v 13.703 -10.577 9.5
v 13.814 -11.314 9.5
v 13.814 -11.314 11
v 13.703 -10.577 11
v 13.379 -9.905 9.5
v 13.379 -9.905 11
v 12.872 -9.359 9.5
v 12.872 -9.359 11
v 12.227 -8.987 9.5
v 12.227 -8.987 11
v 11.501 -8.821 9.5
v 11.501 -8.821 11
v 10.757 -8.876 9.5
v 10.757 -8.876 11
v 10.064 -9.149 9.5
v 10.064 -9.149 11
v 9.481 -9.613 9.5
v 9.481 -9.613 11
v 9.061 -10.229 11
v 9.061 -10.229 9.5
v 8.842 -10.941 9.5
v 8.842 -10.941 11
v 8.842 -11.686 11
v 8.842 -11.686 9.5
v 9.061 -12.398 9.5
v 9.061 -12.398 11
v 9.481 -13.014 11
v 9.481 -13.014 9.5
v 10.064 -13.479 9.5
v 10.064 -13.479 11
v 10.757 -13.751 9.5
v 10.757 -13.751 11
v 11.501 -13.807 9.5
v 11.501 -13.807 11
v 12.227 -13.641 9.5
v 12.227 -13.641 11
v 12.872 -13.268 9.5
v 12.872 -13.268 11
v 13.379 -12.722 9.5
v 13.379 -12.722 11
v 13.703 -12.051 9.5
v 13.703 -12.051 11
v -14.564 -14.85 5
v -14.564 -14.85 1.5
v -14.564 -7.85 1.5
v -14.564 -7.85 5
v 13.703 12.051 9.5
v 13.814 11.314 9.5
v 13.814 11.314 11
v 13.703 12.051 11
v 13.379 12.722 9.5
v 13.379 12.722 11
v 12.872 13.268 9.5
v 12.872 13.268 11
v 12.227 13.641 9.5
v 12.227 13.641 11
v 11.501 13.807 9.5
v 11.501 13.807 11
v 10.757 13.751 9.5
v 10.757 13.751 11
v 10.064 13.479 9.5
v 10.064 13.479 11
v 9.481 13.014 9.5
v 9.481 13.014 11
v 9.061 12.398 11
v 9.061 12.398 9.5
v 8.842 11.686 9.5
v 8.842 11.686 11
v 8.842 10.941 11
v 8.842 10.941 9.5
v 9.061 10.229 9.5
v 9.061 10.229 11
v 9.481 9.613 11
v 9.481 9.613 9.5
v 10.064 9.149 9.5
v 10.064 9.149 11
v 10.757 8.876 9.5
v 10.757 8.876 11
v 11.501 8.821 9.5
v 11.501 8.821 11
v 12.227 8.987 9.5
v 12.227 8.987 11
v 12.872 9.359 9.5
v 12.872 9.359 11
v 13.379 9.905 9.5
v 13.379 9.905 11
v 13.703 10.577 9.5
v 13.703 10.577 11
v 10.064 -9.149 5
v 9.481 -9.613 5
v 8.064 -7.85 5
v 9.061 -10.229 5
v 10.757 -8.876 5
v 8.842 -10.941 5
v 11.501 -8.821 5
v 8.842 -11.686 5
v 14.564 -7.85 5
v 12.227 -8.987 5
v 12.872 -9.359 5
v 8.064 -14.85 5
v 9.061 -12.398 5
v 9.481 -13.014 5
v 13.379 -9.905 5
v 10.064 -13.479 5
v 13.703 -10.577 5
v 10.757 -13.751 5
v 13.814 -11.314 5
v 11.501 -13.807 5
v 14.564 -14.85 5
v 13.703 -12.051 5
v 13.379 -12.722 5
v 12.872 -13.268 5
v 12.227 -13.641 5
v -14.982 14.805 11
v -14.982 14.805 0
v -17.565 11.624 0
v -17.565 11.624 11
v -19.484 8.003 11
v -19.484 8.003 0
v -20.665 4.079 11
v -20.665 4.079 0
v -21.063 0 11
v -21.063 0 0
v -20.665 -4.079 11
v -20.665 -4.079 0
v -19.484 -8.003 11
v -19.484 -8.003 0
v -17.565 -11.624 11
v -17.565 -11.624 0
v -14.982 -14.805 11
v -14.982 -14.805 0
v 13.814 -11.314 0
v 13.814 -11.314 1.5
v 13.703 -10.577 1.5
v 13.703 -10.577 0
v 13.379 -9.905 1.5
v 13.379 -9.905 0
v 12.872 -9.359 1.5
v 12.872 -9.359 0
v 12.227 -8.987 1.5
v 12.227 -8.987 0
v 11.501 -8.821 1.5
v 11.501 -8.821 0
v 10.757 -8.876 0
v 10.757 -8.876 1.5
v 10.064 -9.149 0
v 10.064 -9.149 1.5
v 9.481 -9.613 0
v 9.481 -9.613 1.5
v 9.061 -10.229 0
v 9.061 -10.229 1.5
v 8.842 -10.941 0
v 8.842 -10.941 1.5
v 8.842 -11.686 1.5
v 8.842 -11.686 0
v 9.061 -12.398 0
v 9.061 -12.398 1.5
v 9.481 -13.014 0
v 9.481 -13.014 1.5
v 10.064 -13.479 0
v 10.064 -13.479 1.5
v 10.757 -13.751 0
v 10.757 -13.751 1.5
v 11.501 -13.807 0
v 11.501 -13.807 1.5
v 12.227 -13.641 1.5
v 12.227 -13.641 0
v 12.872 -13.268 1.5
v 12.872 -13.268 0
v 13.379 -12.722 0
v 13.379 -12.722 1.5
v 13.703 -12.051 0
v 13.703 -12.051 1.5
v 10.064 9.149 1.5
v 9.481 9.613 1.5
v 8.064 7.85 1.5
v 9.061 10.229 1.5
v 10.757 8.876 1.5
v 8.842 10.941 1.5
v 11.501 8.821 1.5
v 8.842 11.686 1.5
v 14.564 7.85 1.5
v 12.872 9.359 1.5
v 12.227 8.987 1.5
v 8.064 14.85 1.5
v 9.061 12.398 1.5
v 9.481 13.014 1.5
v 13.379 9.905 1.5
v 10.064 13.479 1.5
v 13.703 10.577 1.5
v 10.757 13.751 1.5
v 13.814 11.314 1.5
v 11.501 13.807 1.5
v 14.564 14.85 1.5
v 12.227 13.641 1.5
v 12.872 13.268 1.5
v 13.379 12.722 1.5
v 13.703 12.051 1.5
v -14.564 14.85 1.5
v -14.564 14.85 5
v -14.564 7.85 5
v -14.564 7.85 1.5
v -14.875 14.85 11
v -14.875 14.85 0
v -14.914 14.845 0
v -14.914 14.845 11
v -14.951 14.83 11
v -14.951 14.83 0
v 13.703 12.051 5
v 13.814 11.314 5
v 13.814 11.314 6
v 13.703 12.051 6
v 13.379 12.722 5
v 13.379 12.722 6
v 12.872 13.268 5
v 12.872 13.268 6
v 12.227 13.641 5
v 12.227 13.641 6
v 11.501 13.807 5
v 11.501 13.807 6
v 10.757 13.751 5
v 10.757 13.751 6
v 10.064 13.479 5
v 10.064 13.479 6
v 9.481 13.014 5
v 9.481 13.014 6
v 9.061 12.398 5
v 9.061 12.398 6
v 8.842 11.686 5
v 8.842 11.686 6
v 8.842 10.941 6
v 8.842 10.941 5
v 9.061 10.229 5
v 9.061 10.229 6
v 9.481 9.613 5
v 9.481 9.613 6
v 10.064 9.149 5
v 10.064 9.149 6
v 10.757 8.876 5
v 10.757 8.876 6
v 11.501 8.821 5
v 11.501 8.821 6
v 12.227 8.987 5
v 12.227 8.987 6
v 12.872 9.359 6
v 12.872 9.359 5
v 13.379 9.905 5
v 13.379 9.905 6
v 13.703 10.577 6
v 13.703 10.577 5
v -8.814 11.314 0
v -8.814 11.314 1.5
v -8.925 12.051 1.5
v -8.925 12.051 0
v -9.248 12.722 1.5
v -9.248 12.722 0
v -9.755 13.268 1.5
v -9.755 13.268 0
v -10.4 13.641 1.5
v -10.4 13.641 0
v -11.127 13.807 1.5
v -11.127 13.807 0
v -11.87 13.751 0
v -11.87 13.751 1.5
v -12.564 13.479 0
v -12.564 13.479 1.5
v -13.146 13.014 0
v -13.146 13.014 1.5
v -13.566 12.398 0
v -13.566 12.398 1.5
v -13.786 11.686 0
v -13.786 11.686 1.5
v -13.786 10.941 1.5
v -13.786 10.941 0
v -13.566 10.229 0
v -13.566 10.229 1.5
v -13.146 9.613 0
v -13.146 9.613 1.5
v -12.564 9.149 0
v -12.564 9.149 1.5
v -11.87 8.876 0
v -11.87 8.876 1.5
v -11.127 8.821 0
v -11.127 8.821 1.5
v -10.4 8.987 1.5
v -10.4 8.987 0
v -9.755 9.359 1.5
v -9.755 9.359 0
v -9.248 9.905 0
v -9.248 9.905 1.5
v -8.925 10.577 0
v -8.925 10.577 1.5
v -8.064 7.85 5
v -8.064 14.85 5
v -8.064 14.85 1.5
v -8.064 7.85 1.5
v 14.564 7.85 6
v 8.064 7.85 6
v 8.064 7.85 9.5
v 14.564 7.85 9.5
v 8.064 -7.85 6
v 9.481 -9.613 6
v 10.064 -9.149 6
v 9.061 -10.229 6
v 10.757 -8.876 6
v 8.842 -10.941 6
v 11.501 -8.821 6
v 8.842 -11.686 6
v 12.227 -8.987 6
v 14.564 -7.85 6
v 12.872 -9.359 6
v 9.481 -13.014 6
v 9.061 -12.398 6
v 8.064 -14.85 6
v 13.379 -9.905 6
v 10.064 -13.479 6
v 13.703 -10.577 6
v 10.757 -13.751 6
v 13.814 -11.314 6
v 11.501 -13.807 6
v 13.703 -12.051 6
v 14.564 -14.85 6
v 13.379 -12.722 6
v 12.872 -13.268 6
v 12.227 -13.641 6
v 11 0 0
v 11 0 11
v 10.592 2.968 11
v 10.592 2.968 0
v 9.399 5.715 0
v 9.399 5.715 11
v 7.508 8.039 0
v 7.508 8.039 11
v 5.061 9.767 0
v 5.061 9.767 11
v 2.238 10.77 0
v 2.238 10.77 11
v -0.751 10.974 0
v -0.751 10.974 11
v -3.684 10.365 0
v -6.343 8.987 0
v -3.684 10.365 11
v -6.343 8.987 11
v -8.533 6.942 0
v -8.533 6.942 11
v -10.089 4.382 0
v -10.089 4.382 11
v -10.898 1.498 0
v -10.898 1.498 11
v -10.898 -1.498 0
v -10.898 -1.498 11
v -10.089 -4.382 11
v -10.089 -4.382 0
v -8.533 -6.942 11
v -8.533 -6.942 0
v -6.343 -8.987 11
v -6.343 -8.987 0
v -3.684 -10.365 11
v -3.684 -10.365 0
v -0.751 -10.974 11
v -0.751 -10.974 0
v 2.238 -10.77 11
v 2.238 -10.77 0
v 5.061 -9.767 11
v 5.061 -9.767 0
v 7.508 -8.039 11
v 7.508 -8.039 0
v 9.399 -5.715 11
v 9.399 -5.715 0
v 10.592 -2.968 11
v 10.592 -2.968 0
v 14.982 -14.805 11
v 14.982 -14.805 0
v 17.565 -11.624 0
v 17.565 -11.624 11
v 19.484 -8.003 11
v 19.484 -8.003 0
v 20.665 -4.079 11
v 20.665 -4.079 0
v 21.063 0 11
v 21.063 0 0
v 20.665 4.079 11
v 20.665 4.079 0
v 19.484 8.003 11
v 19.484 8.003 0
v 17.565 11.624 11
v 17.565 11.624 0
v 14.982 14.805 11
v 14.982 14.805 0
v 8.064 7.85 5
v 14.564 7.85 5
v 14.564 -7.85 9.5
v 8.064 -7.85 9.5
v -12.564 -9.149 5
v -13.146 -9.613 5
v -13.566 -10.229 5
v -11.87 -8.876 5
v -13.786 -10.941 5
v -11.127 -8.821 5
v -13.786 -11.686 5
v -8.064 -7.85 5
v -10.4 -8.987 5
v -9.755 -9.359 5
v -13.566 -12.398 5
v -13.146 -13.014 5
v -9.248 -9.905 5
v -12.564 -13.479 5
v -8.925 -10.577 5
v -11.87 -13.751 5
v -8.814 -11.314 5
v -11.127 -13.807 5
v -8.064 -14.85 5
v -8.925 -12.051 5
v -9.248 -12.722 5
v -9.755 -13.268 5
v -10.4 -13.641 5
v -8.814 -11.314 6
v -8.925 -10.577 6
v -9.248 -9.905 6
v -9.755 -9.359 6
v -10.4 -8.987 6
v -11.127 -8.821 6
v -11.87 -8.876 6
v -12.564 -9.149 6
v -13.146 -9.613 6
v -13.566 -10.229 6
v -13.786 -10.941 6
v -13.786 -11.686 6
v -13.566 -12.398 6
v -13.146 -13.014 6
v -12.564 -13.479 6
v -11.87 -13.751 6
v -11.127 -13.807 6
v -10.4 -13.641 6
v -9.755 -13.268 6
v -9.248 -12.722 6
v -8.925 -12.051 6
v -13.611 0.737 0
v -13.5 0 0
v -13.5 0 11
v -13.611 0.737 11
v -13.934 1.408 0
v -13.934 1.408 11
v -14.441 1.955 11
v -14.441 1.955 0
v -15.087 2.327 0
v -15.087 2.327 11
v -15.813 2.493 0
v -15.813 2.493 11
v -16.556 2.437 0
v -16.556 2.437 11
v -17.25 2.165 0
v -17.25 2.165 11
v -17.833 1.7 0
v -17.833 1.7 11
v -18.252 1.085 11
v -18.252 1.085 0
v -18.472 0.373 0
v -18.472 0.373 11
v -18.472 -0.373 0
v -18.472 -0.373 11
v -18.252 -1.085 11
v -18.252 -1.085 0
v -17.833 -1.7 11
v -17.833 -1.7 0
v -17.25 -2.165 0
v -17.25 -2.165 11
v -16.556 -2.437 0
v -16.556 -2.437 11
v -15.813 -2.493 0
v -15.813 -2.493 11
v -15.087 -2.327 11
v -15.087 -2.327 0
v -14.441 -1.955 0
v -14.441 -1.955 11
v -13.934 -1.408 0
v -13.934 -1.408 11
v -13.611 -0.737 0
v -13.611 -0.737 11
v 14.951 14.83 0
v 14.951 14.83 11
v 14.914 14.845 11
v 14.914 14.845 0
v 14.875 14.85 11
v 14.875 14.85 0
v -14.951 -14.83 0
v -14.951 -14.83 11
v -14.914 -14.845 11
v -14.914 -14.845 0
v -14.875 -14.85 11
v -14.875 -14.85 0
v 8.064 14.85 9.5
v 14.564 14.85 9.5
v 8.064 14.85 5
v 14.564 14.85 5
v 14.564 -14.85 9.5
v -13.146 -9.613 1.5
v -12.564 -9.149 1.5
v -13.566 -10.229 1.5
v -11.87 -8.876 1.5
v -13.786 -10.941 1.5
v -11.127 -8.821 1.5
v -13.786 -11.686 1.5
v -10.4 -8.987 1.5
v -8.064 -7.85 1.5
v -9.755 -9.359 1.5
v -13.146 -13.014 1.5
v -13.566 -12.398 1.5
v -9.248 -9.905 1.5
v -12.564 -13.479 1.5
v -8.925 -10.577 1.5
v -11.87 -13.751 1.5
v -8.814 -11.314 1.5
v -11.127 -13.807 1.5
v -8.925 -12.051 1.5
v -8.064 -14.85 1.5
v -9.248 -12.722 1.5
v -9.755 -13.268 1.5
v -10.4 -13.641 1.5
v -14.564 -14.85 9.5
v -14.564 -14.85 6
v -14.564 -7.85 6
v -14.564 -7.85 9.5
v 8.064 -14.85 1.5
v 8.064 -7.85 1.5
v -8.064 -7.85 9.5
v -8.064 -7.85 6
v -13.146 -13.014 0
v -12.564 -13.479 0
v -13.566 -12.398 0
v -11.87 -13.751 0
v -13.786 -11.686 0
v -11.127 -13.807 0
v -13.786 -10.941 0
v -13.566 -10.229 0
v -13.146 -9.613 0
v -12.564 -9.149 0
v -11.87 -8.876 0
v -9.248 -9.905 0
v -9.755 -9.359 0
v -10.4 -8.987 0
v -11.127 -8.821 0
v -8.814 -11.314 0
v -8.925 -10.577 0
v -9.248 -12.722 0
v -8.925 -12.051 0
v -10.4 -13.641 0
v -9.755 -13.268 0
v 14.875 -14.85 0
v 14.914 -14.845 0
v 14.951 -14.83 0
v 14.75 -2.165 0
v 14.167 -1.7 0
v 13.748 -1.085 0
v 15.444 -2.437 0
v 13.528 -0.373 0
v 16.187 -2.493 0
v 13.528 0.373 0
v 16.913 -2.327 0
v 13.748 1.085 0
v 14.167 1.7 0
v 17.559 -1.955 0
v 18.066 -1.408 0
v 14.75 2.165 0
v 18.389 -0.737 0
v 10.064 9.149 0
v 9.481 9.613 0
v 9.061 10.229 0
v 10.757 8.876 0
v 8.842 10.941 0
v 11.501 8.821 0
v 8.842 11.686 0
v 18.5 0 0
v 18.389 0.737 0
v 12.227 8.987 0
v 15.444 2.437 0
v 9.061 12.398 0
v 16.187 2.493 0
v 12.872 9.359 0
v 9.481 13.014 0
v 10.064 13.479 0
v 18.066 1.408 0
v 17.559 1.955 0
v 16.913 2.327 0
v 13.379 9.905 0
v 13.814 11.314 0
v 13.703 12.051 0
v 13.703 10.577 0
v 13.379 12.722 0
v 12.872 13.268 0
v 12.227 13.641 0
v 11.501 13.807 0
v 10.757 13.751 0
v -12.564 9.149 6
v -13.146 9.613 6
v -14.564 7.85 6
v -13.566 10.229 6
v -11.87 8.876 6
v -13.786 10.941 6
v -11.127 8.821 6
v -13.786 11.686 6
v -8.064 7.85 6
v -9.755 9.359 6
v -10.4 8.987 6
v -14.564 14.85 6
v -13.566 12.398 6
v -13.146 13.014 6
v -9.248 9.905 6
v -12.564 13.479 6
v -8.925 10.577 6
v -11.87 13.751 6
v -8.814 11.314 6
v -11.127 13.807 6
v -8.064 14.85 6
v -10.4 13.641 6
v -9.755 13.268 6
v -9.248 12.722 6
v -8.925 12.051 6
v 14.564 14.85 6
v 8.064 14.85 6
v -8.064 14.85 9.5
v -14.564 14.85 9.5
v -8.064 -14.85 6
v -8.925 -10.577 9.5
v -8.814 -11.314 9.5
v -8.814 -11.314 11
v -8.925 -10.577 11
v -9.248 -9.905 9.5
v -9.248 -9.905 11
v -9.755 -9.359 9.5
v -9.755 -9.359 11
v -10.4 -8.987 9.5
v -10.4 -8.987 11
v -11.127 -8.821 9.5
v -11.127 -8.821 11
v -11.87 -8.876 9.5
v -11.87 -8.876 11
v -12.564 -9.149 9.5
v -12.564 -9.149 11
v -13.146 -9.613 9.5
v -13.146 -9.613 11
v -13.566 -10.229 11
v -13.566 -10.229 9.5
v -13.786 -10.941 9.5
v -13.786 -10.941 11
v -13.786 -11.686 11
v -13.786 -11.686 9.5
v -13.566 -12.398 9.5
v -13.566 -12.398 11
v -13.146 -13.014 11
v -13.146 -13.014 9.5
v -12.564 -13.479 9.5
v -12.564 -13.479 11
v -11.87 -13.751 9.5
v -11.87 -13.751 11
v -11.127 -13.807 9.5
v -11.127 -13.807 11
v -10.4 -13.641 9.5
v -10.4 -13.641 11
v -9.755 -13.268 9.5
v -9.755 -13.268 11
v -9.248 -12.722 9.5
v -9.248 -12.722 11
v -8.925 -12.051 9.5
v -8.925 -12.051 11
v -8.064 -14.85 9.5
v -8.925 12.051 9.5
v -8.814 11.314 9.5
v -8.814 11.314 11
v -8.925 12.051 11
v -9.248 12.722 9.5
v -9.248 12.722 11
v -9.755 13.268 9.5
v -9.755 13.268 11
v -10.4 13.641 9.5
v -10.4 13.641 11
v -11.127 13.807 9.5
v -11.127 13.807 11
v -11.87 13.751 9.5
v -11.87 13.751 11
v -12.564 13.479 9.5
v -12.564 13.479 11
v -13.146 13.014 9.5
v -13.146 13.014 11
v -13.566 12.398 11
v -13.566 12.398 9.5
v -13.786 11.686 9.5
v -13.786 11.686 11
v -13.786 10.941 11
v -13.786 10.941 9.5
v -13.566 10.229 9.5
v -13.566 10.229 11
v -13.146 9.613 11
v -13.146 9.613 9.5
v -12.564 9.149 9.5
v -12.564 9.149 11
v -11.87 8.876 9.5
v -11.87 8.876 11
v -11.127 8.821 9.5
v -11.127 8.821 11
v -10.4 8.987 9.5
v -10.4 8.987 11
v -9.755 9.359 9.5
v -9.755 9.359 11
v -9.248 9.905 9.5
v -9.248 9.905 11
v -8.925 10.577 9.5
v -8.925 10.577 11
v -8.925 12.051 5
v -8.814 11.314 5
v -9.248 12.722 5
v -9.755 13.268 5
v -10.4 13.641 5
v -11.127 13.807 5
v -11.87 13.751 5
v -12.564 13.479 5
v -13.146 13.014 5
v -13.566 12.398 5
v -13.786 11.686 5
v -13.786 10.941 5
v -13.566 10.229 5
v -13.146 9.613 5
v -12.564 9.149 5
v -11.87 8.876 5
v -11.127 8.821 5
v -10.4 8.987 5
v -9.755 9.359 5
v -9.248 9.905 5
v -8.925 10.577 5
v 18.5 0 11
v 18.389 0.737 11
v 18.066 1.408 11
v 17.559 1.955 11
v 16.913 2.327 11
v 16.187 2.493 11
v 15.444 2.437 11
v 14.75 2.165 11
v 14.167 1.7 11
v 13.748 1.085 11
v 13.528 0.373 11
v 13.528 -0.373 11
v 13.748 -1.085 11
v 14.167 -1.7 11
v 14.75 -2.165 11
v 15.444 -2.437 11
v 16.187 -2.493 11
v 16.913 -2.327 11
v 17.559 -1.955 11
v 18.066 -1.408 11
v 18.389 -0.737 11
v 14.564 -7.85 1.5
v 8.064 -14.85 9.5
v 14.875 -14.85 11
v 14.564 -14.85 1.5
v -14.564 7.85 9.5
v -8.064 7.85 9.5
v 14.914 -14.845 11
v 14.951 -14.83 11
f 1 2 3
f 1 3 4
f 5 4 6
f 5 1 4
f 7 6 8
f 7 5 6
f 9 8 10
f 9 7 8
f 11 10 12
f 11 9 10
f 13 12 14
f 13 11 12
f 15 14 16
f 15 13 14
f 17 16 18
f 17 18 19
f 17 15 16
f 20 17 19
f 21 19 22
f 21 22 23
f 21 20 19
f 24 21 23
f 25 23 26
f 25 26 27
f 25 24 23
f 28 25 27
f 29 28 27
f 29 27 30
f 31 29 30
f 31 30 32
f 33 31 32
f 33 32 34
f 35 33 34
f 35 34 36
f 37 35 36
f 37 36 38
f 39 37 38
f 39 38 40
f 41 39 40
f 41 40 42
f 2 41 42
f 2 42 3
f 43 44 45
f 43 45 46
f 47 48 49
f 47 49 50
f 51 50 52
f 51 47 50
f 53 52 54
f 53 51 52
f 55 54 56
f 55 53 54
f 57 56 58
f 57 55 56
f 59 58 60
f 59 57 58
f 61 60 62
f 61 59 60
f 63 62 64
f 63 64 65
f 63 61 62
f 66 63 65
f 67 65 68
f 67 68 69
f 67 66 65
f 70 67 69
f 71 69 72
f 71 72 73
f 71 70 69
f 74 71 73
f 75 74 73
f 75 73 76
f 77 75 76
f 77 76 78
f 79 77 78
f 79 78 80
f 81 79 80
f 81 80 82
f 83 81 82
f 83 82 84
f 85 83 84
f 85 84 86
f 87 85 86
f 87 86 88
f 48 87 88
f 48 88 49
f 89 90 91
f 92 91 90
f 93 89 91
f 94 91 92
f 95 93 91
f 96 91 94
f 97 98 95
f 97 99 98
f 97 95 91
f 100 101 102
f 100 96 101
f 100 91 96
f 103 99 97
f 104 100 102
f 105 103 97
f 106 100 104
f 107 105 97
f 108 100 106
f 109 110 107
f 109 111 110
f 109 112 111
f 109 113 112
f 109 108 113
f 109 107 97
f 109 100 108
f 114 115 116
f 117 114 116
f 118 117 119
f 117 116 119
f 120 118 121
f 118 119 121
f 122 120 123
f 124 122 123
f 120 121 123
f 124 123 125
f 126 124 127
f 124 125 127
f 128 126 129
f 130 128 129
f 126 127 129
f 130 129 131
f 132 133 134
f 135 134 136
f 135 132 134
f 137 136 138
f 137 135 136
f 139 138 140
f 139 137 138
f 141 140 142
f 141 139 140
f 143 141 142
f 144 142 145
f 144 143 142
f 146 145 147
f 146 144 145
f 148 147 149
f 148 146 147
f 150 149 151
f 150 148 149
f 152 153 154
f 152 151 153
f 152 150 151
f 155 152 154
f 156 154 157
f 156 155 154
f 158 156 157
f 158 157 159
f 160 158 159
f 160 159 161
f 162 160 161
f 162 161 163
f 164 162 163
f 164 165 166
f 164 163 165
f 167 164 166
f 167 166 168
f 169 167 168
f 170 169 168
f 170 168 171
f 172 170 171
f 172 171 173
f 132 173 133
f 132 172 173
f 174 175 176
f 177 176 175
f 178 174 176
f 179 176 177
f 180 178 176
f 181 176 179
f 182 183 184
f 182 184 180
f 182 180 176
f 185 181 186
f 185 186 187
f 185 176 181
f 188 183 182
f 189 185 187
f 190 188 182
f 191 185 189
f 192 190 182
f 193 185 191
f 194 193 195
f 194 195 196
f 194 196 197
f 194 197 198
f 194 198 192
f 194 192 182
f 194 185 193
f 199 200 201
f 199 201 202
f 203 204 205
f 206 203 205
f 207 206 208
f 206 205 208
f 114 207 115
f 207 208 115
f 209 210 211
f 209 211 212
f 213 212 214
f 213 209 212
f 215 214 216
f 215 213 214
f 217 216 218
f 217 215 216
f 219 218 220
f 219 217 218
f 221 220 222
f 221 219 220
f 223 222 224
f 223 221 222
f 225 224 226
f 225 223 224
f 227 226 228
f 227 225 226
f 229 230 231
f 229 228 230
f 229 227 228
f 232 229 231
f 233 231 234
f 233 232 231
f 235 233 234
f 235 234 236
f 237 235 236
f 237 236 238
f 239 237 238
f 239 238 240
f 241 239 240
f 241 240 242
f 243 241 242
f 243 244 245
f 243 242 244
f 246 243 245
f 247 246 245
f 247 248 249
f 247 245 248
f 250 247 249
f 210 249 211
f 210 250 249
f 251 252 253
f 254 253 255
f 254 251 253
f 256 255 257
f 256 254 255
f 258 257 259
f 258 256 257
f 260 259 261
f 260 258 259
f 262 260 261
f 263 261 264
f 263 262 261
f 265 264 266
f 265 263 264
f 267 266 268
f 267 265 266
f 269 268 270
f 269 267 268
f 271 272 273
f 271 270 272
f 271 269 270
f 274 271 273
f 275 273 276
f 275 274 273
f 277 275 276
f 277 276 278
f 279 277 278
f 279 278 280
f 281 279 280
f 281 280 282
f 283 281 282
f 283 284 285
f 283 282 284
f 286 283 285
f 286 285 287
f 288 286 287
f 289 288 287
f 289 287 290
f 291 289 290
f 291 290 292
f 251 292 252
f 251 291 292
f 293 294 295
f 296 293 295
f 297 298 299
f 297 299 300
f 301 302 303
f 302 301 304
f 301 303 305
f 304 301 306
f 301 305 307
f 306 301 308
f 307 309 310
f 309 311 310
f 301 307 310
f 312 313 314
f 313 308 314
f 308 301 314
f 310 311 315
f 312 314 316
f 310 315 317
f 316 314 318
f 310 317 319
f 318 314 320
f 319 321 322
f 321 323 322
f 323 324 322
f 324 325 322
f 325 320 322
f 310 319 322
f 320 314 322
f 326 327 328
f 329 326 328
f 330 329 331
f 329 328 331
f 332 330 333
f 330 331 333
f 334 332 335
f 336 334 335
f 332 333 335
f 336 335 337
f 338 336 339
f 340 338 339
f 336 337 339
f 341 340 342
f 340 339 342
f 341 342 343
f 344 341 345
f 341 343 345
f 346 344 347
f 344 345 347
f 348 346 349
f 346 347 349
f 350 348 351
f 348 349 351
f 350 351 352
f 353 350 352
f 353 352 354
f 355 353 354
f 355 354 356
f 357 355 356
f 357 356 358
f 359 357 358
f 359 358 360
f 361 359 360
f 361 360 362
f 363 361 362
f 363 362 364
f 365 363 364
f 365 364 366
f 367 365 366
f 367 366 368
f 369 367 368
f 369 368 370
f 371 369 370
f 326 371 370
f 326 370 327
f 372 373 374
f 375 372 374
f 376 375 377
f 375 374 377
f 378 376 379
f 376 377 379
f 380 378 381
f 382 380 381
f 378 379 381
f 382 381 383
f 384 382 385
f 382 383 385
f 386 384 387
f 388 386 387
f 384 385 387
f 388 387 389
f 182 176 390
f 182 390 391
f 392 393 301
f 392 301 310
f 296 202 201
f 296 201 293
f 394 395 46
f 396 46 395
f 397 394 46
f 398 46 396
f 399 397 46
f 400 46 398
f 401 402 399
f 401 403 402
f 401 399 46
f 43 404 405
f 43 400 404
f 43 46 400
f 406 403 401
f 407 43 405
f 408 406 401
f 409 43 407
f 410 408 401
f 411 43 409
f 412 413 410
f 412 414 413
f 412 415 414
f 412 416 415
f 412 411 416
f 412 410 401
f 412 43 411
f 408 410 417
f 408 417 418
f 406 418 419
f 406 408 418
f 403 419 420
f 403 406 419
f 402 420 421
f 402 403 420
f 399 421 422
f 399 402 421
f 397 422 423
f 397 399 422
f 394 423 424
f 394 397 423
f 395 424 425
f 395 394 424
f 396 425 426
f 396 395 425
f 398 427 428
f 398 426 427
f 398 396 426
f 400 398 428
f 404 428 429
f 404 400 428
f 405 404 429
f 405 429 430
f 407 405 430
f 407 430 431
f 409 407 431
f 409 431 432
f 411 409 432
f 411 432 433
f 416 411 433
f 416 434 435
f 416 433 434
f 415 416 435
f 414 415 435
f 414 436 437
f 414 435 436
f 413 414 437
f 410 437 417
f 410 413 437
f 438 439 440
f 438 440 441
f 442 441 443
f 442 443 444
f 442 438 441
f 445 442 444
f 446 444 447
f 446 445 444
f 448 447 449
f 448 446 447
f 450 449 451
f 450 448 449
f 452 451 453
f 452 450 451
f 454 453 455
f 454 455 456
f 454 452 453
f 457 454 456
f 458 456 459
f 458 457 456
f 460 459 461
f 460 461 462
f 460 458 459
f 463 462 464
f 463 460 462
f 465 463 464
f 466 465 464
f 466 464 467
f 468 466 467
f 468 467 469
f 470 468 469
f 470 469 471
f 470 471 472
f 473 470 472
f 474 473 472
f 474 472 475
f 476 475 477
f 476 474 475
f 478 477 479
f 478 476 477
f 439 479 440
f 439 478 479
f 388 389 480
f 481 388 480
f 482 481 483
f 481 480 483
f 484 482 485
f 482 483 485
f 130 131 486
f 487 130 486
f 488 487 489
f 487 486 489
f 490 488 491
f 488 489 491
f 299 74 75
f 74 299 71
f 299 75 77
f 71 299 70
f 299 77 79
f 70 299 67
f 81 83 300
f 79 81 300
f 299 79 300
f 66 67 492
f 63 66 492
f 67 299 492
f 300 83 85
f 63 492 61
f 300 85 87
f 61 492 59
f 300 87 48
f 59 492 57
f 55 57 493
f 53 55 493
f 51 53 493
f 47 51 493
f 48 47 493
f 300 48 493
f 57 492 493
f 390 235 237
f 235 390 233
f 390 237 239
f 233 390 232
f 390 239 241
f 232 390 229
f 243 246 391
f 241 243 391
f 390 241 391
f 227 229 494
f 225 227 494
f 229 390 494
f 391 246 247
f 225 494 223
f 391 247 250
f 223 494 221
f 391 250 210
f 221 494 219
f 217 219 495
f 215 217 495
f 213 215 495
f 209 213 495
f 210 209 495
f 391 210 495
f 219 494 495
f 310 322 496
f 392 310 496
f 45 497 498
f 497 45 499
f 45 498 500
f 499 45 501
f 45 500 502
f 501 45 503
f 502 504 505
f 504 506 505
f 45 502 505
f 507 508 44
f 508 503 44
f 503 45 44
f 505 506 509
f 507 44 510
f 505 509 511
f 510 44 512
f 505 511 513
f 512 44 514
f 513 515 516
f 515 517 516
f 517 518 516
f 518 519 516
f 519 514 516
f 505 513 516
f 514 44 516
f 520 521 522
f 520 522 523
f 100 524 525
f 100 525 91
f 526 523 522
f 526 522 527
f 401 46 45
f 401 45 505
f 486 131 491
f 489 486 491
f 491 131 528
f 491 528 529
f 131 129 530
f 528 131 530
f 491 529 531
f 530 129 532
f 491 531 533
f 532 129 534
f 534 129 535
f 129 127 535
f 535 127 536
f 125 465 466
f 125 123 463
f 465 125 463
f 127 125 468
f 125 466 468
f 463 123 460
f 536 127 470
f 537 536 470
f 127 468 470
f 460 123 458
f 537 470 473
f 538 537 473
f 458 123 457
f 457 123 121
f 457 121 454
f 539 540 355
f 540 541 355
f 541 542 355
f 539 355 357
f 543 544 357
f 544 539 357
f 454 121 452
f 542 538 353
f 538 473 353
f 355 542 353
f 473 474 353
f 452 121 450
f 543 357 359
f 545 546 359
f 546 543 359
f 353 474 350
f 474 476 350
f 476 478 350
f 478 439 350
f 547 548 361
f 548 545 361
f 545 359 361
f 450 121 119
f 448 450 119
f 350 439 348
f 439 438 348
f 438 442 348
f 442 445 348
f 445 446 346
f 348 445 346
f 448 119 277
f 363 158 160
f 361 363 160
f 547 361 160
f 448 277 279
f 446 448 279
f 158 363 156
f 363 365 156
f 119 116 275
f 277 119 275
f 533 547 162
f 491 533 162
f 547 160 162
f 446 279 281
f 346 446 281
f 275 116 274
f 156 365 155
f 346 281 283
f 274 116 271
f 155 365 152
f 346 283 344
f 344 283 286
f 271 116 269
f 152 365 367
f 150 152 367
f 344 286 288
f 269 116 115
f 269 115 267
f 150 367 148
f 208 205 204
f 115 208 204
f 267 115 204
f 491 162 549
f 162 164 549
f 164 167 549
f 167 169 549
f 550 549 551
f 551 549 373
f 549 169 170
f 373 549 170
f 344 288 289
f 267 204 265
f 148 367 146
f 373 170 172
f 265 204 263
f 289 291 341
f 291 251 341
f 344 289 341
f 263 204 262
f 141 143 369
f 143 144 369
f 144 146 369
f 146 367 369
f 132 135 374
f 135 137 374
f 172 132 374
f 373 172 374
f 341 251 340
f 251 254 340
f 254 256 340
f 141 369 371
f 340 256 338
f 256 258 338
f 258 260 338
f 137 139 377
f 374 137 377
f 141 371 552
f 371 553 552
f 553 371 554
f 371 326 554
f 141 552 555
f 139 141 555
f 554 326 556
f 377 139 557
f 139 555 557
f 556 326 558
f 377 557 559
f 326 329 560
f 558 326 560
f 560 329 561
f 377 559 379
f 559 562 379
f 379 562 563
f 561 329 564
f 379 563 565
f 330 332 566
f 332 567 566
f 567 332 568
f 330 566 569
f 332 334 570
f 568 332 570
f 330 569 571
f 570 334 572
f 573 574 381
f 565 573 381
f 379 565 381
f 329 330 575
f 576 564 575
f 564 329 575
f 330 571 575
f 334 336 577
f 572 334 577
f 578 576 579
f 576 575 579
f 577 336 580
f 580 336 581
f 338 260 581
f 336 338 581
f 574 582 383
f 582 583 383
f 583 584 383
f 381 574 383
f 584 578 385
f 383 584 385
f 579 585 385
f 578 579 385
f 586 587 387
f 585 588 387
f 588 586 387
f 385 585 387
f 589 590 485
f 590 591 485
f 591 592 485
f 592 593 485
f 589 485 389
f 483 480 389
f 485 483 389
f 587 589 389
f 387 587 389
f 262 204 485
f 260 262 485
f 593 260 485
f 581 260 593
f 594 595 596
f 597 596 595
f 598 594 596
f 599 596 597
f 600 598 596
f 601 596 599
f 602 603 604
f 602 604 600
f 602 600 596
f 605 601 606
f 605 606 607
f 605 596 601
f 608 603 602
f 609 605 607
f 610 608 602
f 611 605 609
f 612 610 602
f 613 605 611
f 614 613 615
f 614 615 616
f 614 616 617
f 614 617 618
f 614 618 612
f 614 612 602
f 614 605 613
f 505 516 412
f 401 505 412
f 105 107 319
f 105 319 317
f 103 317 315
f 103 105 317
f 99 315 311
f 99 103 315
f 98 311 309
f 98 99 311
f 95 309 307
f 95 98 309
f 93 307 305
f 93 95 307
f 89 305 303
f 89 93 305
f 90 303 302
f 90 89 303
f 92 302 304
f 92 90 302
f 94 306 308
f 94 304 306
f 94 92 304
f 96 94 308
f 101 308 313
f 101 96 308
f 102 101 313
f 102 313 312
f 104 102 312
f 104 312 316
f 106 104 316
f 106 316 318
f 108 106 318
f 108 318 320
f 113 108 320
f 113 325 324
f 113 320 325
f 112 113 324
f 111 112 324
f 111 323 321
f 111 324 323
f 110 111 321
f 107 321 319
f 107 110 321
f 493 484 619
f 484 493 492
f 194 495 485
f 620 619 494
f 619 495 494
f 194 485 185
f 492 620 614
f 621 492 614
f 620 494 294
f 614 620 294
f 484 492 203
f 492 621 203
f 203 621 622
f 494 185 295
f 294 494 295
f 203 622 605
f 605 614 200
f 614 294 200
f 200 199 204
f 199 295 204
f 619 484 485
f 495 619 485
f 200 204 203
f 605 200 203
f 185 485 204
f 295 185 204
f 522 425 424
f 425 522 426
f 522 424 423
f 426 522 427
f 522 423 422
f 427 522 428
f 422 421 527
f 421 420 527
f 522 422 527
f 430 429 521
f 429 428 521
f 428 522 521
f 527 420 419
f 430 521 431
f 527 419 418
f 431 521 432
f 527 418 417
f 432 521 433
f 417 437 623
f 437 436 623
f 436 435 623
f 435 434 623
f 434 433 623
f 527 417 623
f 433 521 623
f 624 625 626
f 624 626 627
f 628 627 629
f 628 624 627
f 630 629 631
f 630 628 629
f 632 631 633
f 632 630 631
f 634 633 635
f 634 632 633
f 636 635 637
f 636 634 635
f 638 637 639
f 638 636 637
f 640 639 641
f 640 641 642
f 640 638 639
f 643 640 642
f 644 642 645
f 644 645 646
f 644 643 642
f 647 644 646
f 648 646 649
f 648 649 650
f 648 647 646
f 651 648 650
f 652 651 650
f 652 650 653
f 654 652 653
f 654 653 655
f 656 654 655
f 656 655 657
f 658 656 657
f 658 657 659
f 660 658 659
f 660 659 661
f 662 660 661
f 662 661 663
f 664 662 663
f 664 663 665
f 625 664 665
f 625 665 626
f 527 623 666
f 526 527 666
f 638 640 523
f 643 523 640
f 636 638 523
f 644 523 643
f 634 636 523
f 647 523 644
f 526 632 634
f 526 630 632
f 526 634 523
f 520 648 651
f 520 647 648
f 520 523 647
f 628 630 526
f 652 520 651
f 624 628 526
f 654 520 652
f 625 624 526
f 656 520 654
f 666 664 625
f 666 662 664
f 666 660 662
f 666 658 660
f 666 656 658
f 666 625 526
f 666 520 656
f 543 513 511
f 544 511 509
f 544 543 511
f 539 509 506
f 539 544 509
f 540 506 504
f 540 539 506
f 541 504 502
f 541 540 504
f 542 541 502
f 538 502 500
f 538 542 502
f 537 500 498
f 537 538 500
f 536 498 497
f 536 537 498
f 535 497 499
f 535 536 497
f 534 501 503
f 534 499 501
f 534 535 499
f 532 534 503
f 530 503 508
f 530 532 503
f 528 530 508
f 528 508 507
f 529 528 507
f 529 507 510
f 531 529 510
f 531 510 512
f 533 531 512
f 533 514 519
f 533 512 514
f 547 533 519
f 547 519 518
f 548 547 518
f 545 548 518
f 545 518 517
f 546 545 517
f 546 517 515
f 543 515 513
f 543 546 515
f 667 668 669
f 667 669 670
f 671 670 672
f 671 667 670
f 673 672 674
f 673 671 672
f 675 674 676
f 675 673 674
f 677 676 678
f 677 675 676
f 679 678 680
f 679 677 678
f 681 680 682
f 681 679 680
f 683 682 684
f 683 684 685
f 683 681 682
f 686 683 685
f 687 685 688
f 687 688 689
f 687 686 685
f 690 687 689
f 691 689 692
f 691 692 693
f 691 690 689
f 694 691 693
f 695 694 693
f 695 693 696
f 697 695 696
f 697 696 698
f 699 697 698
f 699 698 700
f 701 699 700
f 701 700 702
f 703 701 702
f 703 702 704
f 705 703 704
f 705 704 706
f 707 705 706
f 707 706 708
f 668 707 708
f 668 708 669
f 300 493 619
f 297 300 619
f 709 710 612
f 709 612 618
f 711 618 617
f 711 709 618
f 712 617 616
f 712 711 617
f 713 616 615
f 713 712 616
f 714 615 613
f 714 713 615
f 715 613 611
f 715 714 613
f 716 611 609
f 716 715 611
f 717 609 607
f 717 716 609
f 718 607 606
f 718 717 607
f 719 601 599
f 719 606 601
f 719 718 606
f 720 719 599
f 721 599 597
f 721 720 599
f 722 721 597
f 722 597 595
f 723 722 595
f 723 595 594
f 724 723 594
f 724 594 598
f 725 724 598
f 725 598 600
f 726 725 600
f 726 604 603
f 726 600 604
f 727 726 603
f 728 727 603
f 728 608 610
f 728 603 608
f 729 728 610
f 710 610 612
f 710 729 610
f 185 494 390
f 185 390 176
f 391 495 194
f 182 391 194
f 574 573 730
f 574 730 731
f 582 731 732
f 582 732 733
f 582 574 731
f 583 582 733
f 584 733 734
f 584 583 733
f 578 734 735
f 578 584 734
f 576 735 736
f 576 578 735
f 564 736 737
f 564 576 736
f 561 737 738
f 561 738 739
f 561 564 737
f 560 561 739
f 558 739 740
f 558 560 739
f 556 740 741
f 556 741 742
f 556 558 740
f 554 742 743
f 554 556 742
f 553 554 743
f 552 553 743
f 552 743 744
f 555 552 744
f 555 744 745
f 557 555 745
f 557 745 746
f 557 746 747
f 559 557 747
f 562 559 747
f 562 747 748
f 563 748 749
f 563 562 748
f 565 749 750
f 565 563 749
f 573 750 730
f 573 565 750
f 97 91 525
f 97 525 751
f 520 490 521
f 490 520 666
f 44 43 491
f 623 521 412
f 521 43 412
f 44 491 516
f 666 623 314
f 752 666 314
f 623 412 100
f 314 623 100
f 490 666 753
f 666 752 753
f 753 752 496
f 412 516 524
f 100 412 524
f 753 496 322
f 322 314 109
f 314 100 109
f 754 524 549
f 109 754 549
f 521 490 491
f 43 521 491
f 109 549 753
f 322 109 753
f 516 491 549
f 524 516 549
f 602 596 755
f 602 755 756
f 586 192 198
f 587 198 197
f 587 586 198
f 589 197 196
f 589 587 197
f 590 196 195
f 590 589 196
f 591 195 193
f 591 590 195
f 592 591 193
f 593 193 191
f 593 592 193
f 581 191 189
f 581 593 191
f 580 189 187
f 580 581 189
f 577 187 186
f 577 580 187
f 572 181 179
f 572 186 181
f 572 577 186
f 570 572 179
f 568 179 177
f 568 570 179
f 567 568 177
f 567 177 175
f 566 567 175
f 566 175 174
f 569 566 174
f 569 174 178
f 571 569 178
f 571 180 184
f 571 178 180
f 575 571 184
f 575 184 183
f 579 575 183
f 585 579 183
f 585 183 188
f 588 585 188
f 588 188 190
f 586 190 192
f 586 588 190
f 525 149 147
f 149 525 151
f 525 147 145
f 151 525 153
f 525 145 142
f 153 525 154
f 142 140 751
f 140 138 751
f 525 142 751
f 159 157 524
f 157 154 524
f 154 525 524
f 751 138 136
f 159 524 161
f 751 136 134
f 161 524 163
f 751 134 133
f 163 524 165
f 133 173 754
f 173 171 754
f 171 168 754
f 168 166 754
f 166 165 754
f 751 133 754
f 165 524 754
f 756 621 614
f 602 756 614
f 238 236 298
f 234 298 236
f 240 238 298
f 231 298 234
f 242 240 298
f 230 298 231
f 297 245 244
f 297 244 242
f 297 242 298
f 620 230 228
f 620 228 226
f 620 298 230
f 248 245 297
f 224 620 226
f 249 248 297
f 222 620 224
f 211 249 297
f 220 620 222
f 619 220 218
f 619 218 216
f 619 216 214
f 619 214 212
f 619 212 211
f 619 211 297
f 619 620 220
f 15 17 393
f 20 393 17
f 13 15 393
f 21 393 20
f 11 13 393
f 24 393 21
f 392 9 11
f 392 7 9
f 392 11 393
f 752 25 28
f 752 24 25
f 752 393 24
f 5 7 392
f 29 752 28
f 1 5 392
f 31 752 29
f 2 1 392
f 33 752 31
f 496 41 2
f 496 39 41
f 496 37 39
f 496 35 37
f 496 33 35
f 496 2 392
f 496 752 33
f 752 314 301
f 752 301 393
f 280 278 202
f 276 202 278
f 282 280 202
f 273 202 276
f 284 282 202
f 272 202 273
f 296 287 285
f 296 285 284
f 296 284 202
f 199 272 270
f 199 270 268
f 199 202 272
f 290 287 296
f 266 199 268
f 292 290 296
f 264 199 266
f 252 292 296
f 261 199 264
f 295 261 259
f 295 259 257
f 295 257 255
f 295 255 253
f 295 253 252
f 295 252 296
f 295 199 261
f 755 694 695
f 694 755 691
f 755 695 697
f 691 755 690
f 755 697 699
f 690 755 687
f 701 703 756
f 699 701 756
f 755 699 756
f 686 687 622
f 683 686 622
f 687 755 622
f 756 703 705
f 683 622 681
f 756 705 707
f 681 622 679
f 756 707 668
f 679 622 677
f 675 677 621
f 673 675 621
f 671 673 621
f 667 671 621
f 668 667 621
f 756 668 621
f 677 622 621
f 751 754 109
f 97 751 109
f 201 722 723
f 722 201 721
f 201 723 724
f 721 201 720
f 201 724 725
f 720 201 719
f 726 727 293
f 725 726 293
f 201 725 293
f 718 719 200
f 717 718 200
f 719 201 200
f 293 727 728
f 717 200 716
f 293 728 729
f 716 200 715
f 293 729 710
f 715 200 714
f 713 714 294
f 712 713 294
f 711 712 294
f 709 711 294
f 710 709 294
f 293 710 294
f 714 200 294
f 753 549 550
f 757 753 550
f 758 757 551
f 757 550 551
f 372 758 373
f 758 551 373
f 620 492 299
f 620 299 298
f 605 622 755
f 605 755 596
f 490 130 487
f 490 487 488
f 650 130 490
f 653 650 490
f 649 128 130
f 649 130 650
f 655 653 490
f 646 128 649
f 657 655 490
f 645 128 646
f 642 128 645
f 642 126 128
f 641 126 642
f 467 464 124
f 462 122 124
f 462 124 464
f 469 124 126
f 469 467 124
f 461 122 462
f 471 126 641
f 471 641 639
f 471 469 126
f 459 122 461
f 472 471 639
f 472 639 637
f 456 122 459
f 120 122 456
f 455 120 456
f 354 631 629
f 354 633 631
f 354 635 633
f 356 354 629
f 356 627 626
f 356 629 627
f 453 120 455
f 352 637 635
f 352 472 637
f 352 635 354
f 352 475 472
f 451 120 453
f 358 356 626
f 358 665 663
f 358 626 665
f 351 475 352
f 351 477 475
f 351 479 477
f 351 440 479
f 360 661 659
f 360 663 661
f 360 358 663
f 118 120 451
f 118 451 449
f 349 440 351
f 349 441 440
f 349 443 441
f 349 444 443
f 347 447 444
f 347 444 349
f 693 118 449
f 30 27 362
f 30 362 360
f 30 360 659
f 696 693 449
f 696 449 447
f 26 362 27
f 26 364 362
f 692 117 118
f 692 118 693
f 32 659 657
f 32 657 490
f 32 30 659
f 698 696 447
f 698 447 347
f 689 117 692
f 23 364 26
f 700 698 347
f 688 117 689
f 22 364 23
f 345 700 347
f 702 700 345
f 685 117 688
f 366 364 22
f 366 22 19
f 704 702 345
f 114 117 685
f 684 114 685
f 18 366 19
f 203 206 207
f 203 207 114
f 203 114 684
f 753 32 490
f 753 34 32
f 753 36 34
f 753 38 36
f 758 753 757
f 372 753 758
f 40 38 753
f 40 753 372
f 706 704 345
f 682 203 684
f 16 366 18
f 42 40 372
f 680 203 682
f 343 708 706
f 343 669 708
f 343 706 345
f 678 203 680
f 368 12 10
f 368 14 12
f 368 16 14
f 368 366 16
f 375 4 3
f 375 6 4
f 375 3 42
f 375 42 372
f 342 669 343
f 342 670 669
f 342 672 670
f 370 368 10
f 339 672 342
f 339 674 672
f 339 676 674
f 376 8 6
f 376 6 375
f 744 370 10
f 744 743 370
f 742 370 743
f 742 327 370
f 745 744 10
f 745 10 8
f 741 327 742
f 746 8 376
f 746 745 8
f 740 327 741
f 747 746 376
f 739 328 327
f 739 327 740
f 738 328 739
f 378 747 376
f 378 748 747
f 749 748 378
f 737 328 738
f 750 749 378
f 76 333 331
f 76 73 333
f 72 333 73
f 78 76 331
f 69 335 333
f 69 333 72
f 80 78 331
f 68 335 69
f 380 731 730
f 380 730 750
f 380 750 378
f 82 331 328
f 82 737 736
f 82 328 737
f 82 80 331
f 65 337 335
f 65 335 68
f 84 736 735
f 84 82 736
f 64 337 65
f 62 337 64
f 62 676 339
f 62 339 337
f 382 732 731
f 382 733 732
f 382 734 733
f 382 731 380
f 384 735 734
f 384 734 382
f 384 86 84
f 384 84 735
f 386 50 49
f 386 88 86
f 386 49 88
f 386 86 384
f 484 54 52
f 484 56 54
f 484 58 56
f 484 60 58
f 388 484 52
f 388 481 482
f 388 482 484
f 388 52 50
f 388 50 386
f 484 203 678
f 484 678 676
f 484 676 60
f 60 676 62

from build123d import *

# Parameters (mm, degrees)
ESQUISSE1_R             = 2.5
BOSS_EXTRU_1_DEPTH      = 11
ESQUISSE2_W             = 6.5
ESQUISSE2_H             = 3.5
ENL_V_MAT_EXTRU_1_DEPTH = 7
ESQUISSE3_W             = 6.5
ESQUISSE3_H             = 3.5
ENL_V_MAT_EXTRU_2_DEPTH = 7
ESQUISSE4_R             = 11
ENL_V_MAT_EXTRU_3_DEPTH = 21


with BuildPart() as part:
    # Esquisse1 → Boss.-Extru.1 (new body)
    with BuildSketch(Plane.XY):
        with BuildLine():
            Line((14.875216904, 14.85), (-14.875216904, 14.85))
            ThreePointArc((-14.875216904, 14.85), (-14.933029672, 14.838411285), (-14.981909432, 14.805435784))
            ThreePointArc((-14.981909432, 14.805435784), (-21.063203436, 0), (-14.981909432, -14.805435784))
            ThreePointArc((-14.981909432, -14.805435784), (-14.933029672, -14.838411285), (-14.875216904, -14.85))
            Line((-14.875216904, -14.85), (14.875216904, -14.85))
            ThreePointArc((14.875216904, -14.85), (14.933029672, -14.838411285), (14.981909432, -14.805435784))
            ThreePointArc((14.981909432, -14.805435784), (21.063203436, 0), (14.981909432, 14.805435784))
            ThreePointArc((14.981909432, 14.805435784), (14.933029672, 14.838411285), (14.875216904, 14.85))
        make_face()
        with Locations((-16, 0)):
            Circle(ESQUISSE1_R, mode=Mode.SUBTRACT)
        with Locations((-11.313708499, 11.313708499)):
            Circle(ESQUISSE1_R, mode=Mode.SUBTRACT)
        with Locations((-11.313708499, -11.313708499)):
            Circle(ESQUISSE1_R, mode=Mode.SUBTRACT)
        with Locations((11.313708499, -11.313708499)):
            Circle(ESQUISSE1_R, mode=Mode.SUBTRACT)
        with Locations((16, 0)):
            Circle(ESQUISSE1_R, mode=Mode.SUBTRACT)
        with Locations((11.313708499, 11.313708499)):
            Circle(ESQUISSE1_R, mode=Mode.SUBTRACT)
    extrude(amount=BOSS_EXTRU_1_DEPTH)

    # Esquisse2 → Enlèv. mat.-Extru.1 (cut)
    with BuildSketch(Plane(origin=(0, 14.85, 0), x_dir=(1, 0, 0), z_dir=(0, 1, 0))):
        with Locations((11.313708499, -3.25)):
            Rectangle(ESQUISSE2_W, ESQUISSE2_H)
        with Locations((-11.313708499, -3.25)):
            Rectangle(ESQUISSE2_W, ESQUISSE2_H)
        with Locations((11.313708499, -7.75)):
            Rectangle(ESQUISSE2_W, ESQUISSE2_H)
        with Locations((-11.313708499, -7.75)):
            Rectangle(ESQUISSE2_W, ESQUISSE2_H)
    extrude(amount=-ENL_V_MAT_EXTRU_1_DEPTH, mode=Mode.SUBTRACT)

    # Esquisse3 → Enlèv. mat.-Extru.2 (cut)
    with BuildSketch(Plane.XZ.offset(14.85)):
        with Locations((-11.313708499, 3.25)):
            Rectangle(ESQUISSE3_W, ESQUISSE3_H)
        with Locations((-11.313708499, 7.75)):
            Rectangle(ESQUISSE3_W, ESQUISSE3_H)
        with Locations((11.313708499, 3.25)):
            Rectangle(ESQUISSE3_W, ESQUISSE3_H)
        with Locations((11.313708499, 7.75)):
            Rectangle(ESQUISSE3_W, ESQUISSE3_H)
    extrude(amount=-ENL_V_MAT_EXTRU_2_DEPTH, mode=Mode.SUBTRACT)

    # Esquisse4 → Enlèv. mat.-Extru.3 (cut)
    with BuildSketch(Plane.XY.offset(11)):
        Circle(ESQUISSE4_R)
    extrude(amount=-ENL_V_MAT_EXTRU_3_DEPTH, mode=Mode.SUBTRACT)


solid = part.part
